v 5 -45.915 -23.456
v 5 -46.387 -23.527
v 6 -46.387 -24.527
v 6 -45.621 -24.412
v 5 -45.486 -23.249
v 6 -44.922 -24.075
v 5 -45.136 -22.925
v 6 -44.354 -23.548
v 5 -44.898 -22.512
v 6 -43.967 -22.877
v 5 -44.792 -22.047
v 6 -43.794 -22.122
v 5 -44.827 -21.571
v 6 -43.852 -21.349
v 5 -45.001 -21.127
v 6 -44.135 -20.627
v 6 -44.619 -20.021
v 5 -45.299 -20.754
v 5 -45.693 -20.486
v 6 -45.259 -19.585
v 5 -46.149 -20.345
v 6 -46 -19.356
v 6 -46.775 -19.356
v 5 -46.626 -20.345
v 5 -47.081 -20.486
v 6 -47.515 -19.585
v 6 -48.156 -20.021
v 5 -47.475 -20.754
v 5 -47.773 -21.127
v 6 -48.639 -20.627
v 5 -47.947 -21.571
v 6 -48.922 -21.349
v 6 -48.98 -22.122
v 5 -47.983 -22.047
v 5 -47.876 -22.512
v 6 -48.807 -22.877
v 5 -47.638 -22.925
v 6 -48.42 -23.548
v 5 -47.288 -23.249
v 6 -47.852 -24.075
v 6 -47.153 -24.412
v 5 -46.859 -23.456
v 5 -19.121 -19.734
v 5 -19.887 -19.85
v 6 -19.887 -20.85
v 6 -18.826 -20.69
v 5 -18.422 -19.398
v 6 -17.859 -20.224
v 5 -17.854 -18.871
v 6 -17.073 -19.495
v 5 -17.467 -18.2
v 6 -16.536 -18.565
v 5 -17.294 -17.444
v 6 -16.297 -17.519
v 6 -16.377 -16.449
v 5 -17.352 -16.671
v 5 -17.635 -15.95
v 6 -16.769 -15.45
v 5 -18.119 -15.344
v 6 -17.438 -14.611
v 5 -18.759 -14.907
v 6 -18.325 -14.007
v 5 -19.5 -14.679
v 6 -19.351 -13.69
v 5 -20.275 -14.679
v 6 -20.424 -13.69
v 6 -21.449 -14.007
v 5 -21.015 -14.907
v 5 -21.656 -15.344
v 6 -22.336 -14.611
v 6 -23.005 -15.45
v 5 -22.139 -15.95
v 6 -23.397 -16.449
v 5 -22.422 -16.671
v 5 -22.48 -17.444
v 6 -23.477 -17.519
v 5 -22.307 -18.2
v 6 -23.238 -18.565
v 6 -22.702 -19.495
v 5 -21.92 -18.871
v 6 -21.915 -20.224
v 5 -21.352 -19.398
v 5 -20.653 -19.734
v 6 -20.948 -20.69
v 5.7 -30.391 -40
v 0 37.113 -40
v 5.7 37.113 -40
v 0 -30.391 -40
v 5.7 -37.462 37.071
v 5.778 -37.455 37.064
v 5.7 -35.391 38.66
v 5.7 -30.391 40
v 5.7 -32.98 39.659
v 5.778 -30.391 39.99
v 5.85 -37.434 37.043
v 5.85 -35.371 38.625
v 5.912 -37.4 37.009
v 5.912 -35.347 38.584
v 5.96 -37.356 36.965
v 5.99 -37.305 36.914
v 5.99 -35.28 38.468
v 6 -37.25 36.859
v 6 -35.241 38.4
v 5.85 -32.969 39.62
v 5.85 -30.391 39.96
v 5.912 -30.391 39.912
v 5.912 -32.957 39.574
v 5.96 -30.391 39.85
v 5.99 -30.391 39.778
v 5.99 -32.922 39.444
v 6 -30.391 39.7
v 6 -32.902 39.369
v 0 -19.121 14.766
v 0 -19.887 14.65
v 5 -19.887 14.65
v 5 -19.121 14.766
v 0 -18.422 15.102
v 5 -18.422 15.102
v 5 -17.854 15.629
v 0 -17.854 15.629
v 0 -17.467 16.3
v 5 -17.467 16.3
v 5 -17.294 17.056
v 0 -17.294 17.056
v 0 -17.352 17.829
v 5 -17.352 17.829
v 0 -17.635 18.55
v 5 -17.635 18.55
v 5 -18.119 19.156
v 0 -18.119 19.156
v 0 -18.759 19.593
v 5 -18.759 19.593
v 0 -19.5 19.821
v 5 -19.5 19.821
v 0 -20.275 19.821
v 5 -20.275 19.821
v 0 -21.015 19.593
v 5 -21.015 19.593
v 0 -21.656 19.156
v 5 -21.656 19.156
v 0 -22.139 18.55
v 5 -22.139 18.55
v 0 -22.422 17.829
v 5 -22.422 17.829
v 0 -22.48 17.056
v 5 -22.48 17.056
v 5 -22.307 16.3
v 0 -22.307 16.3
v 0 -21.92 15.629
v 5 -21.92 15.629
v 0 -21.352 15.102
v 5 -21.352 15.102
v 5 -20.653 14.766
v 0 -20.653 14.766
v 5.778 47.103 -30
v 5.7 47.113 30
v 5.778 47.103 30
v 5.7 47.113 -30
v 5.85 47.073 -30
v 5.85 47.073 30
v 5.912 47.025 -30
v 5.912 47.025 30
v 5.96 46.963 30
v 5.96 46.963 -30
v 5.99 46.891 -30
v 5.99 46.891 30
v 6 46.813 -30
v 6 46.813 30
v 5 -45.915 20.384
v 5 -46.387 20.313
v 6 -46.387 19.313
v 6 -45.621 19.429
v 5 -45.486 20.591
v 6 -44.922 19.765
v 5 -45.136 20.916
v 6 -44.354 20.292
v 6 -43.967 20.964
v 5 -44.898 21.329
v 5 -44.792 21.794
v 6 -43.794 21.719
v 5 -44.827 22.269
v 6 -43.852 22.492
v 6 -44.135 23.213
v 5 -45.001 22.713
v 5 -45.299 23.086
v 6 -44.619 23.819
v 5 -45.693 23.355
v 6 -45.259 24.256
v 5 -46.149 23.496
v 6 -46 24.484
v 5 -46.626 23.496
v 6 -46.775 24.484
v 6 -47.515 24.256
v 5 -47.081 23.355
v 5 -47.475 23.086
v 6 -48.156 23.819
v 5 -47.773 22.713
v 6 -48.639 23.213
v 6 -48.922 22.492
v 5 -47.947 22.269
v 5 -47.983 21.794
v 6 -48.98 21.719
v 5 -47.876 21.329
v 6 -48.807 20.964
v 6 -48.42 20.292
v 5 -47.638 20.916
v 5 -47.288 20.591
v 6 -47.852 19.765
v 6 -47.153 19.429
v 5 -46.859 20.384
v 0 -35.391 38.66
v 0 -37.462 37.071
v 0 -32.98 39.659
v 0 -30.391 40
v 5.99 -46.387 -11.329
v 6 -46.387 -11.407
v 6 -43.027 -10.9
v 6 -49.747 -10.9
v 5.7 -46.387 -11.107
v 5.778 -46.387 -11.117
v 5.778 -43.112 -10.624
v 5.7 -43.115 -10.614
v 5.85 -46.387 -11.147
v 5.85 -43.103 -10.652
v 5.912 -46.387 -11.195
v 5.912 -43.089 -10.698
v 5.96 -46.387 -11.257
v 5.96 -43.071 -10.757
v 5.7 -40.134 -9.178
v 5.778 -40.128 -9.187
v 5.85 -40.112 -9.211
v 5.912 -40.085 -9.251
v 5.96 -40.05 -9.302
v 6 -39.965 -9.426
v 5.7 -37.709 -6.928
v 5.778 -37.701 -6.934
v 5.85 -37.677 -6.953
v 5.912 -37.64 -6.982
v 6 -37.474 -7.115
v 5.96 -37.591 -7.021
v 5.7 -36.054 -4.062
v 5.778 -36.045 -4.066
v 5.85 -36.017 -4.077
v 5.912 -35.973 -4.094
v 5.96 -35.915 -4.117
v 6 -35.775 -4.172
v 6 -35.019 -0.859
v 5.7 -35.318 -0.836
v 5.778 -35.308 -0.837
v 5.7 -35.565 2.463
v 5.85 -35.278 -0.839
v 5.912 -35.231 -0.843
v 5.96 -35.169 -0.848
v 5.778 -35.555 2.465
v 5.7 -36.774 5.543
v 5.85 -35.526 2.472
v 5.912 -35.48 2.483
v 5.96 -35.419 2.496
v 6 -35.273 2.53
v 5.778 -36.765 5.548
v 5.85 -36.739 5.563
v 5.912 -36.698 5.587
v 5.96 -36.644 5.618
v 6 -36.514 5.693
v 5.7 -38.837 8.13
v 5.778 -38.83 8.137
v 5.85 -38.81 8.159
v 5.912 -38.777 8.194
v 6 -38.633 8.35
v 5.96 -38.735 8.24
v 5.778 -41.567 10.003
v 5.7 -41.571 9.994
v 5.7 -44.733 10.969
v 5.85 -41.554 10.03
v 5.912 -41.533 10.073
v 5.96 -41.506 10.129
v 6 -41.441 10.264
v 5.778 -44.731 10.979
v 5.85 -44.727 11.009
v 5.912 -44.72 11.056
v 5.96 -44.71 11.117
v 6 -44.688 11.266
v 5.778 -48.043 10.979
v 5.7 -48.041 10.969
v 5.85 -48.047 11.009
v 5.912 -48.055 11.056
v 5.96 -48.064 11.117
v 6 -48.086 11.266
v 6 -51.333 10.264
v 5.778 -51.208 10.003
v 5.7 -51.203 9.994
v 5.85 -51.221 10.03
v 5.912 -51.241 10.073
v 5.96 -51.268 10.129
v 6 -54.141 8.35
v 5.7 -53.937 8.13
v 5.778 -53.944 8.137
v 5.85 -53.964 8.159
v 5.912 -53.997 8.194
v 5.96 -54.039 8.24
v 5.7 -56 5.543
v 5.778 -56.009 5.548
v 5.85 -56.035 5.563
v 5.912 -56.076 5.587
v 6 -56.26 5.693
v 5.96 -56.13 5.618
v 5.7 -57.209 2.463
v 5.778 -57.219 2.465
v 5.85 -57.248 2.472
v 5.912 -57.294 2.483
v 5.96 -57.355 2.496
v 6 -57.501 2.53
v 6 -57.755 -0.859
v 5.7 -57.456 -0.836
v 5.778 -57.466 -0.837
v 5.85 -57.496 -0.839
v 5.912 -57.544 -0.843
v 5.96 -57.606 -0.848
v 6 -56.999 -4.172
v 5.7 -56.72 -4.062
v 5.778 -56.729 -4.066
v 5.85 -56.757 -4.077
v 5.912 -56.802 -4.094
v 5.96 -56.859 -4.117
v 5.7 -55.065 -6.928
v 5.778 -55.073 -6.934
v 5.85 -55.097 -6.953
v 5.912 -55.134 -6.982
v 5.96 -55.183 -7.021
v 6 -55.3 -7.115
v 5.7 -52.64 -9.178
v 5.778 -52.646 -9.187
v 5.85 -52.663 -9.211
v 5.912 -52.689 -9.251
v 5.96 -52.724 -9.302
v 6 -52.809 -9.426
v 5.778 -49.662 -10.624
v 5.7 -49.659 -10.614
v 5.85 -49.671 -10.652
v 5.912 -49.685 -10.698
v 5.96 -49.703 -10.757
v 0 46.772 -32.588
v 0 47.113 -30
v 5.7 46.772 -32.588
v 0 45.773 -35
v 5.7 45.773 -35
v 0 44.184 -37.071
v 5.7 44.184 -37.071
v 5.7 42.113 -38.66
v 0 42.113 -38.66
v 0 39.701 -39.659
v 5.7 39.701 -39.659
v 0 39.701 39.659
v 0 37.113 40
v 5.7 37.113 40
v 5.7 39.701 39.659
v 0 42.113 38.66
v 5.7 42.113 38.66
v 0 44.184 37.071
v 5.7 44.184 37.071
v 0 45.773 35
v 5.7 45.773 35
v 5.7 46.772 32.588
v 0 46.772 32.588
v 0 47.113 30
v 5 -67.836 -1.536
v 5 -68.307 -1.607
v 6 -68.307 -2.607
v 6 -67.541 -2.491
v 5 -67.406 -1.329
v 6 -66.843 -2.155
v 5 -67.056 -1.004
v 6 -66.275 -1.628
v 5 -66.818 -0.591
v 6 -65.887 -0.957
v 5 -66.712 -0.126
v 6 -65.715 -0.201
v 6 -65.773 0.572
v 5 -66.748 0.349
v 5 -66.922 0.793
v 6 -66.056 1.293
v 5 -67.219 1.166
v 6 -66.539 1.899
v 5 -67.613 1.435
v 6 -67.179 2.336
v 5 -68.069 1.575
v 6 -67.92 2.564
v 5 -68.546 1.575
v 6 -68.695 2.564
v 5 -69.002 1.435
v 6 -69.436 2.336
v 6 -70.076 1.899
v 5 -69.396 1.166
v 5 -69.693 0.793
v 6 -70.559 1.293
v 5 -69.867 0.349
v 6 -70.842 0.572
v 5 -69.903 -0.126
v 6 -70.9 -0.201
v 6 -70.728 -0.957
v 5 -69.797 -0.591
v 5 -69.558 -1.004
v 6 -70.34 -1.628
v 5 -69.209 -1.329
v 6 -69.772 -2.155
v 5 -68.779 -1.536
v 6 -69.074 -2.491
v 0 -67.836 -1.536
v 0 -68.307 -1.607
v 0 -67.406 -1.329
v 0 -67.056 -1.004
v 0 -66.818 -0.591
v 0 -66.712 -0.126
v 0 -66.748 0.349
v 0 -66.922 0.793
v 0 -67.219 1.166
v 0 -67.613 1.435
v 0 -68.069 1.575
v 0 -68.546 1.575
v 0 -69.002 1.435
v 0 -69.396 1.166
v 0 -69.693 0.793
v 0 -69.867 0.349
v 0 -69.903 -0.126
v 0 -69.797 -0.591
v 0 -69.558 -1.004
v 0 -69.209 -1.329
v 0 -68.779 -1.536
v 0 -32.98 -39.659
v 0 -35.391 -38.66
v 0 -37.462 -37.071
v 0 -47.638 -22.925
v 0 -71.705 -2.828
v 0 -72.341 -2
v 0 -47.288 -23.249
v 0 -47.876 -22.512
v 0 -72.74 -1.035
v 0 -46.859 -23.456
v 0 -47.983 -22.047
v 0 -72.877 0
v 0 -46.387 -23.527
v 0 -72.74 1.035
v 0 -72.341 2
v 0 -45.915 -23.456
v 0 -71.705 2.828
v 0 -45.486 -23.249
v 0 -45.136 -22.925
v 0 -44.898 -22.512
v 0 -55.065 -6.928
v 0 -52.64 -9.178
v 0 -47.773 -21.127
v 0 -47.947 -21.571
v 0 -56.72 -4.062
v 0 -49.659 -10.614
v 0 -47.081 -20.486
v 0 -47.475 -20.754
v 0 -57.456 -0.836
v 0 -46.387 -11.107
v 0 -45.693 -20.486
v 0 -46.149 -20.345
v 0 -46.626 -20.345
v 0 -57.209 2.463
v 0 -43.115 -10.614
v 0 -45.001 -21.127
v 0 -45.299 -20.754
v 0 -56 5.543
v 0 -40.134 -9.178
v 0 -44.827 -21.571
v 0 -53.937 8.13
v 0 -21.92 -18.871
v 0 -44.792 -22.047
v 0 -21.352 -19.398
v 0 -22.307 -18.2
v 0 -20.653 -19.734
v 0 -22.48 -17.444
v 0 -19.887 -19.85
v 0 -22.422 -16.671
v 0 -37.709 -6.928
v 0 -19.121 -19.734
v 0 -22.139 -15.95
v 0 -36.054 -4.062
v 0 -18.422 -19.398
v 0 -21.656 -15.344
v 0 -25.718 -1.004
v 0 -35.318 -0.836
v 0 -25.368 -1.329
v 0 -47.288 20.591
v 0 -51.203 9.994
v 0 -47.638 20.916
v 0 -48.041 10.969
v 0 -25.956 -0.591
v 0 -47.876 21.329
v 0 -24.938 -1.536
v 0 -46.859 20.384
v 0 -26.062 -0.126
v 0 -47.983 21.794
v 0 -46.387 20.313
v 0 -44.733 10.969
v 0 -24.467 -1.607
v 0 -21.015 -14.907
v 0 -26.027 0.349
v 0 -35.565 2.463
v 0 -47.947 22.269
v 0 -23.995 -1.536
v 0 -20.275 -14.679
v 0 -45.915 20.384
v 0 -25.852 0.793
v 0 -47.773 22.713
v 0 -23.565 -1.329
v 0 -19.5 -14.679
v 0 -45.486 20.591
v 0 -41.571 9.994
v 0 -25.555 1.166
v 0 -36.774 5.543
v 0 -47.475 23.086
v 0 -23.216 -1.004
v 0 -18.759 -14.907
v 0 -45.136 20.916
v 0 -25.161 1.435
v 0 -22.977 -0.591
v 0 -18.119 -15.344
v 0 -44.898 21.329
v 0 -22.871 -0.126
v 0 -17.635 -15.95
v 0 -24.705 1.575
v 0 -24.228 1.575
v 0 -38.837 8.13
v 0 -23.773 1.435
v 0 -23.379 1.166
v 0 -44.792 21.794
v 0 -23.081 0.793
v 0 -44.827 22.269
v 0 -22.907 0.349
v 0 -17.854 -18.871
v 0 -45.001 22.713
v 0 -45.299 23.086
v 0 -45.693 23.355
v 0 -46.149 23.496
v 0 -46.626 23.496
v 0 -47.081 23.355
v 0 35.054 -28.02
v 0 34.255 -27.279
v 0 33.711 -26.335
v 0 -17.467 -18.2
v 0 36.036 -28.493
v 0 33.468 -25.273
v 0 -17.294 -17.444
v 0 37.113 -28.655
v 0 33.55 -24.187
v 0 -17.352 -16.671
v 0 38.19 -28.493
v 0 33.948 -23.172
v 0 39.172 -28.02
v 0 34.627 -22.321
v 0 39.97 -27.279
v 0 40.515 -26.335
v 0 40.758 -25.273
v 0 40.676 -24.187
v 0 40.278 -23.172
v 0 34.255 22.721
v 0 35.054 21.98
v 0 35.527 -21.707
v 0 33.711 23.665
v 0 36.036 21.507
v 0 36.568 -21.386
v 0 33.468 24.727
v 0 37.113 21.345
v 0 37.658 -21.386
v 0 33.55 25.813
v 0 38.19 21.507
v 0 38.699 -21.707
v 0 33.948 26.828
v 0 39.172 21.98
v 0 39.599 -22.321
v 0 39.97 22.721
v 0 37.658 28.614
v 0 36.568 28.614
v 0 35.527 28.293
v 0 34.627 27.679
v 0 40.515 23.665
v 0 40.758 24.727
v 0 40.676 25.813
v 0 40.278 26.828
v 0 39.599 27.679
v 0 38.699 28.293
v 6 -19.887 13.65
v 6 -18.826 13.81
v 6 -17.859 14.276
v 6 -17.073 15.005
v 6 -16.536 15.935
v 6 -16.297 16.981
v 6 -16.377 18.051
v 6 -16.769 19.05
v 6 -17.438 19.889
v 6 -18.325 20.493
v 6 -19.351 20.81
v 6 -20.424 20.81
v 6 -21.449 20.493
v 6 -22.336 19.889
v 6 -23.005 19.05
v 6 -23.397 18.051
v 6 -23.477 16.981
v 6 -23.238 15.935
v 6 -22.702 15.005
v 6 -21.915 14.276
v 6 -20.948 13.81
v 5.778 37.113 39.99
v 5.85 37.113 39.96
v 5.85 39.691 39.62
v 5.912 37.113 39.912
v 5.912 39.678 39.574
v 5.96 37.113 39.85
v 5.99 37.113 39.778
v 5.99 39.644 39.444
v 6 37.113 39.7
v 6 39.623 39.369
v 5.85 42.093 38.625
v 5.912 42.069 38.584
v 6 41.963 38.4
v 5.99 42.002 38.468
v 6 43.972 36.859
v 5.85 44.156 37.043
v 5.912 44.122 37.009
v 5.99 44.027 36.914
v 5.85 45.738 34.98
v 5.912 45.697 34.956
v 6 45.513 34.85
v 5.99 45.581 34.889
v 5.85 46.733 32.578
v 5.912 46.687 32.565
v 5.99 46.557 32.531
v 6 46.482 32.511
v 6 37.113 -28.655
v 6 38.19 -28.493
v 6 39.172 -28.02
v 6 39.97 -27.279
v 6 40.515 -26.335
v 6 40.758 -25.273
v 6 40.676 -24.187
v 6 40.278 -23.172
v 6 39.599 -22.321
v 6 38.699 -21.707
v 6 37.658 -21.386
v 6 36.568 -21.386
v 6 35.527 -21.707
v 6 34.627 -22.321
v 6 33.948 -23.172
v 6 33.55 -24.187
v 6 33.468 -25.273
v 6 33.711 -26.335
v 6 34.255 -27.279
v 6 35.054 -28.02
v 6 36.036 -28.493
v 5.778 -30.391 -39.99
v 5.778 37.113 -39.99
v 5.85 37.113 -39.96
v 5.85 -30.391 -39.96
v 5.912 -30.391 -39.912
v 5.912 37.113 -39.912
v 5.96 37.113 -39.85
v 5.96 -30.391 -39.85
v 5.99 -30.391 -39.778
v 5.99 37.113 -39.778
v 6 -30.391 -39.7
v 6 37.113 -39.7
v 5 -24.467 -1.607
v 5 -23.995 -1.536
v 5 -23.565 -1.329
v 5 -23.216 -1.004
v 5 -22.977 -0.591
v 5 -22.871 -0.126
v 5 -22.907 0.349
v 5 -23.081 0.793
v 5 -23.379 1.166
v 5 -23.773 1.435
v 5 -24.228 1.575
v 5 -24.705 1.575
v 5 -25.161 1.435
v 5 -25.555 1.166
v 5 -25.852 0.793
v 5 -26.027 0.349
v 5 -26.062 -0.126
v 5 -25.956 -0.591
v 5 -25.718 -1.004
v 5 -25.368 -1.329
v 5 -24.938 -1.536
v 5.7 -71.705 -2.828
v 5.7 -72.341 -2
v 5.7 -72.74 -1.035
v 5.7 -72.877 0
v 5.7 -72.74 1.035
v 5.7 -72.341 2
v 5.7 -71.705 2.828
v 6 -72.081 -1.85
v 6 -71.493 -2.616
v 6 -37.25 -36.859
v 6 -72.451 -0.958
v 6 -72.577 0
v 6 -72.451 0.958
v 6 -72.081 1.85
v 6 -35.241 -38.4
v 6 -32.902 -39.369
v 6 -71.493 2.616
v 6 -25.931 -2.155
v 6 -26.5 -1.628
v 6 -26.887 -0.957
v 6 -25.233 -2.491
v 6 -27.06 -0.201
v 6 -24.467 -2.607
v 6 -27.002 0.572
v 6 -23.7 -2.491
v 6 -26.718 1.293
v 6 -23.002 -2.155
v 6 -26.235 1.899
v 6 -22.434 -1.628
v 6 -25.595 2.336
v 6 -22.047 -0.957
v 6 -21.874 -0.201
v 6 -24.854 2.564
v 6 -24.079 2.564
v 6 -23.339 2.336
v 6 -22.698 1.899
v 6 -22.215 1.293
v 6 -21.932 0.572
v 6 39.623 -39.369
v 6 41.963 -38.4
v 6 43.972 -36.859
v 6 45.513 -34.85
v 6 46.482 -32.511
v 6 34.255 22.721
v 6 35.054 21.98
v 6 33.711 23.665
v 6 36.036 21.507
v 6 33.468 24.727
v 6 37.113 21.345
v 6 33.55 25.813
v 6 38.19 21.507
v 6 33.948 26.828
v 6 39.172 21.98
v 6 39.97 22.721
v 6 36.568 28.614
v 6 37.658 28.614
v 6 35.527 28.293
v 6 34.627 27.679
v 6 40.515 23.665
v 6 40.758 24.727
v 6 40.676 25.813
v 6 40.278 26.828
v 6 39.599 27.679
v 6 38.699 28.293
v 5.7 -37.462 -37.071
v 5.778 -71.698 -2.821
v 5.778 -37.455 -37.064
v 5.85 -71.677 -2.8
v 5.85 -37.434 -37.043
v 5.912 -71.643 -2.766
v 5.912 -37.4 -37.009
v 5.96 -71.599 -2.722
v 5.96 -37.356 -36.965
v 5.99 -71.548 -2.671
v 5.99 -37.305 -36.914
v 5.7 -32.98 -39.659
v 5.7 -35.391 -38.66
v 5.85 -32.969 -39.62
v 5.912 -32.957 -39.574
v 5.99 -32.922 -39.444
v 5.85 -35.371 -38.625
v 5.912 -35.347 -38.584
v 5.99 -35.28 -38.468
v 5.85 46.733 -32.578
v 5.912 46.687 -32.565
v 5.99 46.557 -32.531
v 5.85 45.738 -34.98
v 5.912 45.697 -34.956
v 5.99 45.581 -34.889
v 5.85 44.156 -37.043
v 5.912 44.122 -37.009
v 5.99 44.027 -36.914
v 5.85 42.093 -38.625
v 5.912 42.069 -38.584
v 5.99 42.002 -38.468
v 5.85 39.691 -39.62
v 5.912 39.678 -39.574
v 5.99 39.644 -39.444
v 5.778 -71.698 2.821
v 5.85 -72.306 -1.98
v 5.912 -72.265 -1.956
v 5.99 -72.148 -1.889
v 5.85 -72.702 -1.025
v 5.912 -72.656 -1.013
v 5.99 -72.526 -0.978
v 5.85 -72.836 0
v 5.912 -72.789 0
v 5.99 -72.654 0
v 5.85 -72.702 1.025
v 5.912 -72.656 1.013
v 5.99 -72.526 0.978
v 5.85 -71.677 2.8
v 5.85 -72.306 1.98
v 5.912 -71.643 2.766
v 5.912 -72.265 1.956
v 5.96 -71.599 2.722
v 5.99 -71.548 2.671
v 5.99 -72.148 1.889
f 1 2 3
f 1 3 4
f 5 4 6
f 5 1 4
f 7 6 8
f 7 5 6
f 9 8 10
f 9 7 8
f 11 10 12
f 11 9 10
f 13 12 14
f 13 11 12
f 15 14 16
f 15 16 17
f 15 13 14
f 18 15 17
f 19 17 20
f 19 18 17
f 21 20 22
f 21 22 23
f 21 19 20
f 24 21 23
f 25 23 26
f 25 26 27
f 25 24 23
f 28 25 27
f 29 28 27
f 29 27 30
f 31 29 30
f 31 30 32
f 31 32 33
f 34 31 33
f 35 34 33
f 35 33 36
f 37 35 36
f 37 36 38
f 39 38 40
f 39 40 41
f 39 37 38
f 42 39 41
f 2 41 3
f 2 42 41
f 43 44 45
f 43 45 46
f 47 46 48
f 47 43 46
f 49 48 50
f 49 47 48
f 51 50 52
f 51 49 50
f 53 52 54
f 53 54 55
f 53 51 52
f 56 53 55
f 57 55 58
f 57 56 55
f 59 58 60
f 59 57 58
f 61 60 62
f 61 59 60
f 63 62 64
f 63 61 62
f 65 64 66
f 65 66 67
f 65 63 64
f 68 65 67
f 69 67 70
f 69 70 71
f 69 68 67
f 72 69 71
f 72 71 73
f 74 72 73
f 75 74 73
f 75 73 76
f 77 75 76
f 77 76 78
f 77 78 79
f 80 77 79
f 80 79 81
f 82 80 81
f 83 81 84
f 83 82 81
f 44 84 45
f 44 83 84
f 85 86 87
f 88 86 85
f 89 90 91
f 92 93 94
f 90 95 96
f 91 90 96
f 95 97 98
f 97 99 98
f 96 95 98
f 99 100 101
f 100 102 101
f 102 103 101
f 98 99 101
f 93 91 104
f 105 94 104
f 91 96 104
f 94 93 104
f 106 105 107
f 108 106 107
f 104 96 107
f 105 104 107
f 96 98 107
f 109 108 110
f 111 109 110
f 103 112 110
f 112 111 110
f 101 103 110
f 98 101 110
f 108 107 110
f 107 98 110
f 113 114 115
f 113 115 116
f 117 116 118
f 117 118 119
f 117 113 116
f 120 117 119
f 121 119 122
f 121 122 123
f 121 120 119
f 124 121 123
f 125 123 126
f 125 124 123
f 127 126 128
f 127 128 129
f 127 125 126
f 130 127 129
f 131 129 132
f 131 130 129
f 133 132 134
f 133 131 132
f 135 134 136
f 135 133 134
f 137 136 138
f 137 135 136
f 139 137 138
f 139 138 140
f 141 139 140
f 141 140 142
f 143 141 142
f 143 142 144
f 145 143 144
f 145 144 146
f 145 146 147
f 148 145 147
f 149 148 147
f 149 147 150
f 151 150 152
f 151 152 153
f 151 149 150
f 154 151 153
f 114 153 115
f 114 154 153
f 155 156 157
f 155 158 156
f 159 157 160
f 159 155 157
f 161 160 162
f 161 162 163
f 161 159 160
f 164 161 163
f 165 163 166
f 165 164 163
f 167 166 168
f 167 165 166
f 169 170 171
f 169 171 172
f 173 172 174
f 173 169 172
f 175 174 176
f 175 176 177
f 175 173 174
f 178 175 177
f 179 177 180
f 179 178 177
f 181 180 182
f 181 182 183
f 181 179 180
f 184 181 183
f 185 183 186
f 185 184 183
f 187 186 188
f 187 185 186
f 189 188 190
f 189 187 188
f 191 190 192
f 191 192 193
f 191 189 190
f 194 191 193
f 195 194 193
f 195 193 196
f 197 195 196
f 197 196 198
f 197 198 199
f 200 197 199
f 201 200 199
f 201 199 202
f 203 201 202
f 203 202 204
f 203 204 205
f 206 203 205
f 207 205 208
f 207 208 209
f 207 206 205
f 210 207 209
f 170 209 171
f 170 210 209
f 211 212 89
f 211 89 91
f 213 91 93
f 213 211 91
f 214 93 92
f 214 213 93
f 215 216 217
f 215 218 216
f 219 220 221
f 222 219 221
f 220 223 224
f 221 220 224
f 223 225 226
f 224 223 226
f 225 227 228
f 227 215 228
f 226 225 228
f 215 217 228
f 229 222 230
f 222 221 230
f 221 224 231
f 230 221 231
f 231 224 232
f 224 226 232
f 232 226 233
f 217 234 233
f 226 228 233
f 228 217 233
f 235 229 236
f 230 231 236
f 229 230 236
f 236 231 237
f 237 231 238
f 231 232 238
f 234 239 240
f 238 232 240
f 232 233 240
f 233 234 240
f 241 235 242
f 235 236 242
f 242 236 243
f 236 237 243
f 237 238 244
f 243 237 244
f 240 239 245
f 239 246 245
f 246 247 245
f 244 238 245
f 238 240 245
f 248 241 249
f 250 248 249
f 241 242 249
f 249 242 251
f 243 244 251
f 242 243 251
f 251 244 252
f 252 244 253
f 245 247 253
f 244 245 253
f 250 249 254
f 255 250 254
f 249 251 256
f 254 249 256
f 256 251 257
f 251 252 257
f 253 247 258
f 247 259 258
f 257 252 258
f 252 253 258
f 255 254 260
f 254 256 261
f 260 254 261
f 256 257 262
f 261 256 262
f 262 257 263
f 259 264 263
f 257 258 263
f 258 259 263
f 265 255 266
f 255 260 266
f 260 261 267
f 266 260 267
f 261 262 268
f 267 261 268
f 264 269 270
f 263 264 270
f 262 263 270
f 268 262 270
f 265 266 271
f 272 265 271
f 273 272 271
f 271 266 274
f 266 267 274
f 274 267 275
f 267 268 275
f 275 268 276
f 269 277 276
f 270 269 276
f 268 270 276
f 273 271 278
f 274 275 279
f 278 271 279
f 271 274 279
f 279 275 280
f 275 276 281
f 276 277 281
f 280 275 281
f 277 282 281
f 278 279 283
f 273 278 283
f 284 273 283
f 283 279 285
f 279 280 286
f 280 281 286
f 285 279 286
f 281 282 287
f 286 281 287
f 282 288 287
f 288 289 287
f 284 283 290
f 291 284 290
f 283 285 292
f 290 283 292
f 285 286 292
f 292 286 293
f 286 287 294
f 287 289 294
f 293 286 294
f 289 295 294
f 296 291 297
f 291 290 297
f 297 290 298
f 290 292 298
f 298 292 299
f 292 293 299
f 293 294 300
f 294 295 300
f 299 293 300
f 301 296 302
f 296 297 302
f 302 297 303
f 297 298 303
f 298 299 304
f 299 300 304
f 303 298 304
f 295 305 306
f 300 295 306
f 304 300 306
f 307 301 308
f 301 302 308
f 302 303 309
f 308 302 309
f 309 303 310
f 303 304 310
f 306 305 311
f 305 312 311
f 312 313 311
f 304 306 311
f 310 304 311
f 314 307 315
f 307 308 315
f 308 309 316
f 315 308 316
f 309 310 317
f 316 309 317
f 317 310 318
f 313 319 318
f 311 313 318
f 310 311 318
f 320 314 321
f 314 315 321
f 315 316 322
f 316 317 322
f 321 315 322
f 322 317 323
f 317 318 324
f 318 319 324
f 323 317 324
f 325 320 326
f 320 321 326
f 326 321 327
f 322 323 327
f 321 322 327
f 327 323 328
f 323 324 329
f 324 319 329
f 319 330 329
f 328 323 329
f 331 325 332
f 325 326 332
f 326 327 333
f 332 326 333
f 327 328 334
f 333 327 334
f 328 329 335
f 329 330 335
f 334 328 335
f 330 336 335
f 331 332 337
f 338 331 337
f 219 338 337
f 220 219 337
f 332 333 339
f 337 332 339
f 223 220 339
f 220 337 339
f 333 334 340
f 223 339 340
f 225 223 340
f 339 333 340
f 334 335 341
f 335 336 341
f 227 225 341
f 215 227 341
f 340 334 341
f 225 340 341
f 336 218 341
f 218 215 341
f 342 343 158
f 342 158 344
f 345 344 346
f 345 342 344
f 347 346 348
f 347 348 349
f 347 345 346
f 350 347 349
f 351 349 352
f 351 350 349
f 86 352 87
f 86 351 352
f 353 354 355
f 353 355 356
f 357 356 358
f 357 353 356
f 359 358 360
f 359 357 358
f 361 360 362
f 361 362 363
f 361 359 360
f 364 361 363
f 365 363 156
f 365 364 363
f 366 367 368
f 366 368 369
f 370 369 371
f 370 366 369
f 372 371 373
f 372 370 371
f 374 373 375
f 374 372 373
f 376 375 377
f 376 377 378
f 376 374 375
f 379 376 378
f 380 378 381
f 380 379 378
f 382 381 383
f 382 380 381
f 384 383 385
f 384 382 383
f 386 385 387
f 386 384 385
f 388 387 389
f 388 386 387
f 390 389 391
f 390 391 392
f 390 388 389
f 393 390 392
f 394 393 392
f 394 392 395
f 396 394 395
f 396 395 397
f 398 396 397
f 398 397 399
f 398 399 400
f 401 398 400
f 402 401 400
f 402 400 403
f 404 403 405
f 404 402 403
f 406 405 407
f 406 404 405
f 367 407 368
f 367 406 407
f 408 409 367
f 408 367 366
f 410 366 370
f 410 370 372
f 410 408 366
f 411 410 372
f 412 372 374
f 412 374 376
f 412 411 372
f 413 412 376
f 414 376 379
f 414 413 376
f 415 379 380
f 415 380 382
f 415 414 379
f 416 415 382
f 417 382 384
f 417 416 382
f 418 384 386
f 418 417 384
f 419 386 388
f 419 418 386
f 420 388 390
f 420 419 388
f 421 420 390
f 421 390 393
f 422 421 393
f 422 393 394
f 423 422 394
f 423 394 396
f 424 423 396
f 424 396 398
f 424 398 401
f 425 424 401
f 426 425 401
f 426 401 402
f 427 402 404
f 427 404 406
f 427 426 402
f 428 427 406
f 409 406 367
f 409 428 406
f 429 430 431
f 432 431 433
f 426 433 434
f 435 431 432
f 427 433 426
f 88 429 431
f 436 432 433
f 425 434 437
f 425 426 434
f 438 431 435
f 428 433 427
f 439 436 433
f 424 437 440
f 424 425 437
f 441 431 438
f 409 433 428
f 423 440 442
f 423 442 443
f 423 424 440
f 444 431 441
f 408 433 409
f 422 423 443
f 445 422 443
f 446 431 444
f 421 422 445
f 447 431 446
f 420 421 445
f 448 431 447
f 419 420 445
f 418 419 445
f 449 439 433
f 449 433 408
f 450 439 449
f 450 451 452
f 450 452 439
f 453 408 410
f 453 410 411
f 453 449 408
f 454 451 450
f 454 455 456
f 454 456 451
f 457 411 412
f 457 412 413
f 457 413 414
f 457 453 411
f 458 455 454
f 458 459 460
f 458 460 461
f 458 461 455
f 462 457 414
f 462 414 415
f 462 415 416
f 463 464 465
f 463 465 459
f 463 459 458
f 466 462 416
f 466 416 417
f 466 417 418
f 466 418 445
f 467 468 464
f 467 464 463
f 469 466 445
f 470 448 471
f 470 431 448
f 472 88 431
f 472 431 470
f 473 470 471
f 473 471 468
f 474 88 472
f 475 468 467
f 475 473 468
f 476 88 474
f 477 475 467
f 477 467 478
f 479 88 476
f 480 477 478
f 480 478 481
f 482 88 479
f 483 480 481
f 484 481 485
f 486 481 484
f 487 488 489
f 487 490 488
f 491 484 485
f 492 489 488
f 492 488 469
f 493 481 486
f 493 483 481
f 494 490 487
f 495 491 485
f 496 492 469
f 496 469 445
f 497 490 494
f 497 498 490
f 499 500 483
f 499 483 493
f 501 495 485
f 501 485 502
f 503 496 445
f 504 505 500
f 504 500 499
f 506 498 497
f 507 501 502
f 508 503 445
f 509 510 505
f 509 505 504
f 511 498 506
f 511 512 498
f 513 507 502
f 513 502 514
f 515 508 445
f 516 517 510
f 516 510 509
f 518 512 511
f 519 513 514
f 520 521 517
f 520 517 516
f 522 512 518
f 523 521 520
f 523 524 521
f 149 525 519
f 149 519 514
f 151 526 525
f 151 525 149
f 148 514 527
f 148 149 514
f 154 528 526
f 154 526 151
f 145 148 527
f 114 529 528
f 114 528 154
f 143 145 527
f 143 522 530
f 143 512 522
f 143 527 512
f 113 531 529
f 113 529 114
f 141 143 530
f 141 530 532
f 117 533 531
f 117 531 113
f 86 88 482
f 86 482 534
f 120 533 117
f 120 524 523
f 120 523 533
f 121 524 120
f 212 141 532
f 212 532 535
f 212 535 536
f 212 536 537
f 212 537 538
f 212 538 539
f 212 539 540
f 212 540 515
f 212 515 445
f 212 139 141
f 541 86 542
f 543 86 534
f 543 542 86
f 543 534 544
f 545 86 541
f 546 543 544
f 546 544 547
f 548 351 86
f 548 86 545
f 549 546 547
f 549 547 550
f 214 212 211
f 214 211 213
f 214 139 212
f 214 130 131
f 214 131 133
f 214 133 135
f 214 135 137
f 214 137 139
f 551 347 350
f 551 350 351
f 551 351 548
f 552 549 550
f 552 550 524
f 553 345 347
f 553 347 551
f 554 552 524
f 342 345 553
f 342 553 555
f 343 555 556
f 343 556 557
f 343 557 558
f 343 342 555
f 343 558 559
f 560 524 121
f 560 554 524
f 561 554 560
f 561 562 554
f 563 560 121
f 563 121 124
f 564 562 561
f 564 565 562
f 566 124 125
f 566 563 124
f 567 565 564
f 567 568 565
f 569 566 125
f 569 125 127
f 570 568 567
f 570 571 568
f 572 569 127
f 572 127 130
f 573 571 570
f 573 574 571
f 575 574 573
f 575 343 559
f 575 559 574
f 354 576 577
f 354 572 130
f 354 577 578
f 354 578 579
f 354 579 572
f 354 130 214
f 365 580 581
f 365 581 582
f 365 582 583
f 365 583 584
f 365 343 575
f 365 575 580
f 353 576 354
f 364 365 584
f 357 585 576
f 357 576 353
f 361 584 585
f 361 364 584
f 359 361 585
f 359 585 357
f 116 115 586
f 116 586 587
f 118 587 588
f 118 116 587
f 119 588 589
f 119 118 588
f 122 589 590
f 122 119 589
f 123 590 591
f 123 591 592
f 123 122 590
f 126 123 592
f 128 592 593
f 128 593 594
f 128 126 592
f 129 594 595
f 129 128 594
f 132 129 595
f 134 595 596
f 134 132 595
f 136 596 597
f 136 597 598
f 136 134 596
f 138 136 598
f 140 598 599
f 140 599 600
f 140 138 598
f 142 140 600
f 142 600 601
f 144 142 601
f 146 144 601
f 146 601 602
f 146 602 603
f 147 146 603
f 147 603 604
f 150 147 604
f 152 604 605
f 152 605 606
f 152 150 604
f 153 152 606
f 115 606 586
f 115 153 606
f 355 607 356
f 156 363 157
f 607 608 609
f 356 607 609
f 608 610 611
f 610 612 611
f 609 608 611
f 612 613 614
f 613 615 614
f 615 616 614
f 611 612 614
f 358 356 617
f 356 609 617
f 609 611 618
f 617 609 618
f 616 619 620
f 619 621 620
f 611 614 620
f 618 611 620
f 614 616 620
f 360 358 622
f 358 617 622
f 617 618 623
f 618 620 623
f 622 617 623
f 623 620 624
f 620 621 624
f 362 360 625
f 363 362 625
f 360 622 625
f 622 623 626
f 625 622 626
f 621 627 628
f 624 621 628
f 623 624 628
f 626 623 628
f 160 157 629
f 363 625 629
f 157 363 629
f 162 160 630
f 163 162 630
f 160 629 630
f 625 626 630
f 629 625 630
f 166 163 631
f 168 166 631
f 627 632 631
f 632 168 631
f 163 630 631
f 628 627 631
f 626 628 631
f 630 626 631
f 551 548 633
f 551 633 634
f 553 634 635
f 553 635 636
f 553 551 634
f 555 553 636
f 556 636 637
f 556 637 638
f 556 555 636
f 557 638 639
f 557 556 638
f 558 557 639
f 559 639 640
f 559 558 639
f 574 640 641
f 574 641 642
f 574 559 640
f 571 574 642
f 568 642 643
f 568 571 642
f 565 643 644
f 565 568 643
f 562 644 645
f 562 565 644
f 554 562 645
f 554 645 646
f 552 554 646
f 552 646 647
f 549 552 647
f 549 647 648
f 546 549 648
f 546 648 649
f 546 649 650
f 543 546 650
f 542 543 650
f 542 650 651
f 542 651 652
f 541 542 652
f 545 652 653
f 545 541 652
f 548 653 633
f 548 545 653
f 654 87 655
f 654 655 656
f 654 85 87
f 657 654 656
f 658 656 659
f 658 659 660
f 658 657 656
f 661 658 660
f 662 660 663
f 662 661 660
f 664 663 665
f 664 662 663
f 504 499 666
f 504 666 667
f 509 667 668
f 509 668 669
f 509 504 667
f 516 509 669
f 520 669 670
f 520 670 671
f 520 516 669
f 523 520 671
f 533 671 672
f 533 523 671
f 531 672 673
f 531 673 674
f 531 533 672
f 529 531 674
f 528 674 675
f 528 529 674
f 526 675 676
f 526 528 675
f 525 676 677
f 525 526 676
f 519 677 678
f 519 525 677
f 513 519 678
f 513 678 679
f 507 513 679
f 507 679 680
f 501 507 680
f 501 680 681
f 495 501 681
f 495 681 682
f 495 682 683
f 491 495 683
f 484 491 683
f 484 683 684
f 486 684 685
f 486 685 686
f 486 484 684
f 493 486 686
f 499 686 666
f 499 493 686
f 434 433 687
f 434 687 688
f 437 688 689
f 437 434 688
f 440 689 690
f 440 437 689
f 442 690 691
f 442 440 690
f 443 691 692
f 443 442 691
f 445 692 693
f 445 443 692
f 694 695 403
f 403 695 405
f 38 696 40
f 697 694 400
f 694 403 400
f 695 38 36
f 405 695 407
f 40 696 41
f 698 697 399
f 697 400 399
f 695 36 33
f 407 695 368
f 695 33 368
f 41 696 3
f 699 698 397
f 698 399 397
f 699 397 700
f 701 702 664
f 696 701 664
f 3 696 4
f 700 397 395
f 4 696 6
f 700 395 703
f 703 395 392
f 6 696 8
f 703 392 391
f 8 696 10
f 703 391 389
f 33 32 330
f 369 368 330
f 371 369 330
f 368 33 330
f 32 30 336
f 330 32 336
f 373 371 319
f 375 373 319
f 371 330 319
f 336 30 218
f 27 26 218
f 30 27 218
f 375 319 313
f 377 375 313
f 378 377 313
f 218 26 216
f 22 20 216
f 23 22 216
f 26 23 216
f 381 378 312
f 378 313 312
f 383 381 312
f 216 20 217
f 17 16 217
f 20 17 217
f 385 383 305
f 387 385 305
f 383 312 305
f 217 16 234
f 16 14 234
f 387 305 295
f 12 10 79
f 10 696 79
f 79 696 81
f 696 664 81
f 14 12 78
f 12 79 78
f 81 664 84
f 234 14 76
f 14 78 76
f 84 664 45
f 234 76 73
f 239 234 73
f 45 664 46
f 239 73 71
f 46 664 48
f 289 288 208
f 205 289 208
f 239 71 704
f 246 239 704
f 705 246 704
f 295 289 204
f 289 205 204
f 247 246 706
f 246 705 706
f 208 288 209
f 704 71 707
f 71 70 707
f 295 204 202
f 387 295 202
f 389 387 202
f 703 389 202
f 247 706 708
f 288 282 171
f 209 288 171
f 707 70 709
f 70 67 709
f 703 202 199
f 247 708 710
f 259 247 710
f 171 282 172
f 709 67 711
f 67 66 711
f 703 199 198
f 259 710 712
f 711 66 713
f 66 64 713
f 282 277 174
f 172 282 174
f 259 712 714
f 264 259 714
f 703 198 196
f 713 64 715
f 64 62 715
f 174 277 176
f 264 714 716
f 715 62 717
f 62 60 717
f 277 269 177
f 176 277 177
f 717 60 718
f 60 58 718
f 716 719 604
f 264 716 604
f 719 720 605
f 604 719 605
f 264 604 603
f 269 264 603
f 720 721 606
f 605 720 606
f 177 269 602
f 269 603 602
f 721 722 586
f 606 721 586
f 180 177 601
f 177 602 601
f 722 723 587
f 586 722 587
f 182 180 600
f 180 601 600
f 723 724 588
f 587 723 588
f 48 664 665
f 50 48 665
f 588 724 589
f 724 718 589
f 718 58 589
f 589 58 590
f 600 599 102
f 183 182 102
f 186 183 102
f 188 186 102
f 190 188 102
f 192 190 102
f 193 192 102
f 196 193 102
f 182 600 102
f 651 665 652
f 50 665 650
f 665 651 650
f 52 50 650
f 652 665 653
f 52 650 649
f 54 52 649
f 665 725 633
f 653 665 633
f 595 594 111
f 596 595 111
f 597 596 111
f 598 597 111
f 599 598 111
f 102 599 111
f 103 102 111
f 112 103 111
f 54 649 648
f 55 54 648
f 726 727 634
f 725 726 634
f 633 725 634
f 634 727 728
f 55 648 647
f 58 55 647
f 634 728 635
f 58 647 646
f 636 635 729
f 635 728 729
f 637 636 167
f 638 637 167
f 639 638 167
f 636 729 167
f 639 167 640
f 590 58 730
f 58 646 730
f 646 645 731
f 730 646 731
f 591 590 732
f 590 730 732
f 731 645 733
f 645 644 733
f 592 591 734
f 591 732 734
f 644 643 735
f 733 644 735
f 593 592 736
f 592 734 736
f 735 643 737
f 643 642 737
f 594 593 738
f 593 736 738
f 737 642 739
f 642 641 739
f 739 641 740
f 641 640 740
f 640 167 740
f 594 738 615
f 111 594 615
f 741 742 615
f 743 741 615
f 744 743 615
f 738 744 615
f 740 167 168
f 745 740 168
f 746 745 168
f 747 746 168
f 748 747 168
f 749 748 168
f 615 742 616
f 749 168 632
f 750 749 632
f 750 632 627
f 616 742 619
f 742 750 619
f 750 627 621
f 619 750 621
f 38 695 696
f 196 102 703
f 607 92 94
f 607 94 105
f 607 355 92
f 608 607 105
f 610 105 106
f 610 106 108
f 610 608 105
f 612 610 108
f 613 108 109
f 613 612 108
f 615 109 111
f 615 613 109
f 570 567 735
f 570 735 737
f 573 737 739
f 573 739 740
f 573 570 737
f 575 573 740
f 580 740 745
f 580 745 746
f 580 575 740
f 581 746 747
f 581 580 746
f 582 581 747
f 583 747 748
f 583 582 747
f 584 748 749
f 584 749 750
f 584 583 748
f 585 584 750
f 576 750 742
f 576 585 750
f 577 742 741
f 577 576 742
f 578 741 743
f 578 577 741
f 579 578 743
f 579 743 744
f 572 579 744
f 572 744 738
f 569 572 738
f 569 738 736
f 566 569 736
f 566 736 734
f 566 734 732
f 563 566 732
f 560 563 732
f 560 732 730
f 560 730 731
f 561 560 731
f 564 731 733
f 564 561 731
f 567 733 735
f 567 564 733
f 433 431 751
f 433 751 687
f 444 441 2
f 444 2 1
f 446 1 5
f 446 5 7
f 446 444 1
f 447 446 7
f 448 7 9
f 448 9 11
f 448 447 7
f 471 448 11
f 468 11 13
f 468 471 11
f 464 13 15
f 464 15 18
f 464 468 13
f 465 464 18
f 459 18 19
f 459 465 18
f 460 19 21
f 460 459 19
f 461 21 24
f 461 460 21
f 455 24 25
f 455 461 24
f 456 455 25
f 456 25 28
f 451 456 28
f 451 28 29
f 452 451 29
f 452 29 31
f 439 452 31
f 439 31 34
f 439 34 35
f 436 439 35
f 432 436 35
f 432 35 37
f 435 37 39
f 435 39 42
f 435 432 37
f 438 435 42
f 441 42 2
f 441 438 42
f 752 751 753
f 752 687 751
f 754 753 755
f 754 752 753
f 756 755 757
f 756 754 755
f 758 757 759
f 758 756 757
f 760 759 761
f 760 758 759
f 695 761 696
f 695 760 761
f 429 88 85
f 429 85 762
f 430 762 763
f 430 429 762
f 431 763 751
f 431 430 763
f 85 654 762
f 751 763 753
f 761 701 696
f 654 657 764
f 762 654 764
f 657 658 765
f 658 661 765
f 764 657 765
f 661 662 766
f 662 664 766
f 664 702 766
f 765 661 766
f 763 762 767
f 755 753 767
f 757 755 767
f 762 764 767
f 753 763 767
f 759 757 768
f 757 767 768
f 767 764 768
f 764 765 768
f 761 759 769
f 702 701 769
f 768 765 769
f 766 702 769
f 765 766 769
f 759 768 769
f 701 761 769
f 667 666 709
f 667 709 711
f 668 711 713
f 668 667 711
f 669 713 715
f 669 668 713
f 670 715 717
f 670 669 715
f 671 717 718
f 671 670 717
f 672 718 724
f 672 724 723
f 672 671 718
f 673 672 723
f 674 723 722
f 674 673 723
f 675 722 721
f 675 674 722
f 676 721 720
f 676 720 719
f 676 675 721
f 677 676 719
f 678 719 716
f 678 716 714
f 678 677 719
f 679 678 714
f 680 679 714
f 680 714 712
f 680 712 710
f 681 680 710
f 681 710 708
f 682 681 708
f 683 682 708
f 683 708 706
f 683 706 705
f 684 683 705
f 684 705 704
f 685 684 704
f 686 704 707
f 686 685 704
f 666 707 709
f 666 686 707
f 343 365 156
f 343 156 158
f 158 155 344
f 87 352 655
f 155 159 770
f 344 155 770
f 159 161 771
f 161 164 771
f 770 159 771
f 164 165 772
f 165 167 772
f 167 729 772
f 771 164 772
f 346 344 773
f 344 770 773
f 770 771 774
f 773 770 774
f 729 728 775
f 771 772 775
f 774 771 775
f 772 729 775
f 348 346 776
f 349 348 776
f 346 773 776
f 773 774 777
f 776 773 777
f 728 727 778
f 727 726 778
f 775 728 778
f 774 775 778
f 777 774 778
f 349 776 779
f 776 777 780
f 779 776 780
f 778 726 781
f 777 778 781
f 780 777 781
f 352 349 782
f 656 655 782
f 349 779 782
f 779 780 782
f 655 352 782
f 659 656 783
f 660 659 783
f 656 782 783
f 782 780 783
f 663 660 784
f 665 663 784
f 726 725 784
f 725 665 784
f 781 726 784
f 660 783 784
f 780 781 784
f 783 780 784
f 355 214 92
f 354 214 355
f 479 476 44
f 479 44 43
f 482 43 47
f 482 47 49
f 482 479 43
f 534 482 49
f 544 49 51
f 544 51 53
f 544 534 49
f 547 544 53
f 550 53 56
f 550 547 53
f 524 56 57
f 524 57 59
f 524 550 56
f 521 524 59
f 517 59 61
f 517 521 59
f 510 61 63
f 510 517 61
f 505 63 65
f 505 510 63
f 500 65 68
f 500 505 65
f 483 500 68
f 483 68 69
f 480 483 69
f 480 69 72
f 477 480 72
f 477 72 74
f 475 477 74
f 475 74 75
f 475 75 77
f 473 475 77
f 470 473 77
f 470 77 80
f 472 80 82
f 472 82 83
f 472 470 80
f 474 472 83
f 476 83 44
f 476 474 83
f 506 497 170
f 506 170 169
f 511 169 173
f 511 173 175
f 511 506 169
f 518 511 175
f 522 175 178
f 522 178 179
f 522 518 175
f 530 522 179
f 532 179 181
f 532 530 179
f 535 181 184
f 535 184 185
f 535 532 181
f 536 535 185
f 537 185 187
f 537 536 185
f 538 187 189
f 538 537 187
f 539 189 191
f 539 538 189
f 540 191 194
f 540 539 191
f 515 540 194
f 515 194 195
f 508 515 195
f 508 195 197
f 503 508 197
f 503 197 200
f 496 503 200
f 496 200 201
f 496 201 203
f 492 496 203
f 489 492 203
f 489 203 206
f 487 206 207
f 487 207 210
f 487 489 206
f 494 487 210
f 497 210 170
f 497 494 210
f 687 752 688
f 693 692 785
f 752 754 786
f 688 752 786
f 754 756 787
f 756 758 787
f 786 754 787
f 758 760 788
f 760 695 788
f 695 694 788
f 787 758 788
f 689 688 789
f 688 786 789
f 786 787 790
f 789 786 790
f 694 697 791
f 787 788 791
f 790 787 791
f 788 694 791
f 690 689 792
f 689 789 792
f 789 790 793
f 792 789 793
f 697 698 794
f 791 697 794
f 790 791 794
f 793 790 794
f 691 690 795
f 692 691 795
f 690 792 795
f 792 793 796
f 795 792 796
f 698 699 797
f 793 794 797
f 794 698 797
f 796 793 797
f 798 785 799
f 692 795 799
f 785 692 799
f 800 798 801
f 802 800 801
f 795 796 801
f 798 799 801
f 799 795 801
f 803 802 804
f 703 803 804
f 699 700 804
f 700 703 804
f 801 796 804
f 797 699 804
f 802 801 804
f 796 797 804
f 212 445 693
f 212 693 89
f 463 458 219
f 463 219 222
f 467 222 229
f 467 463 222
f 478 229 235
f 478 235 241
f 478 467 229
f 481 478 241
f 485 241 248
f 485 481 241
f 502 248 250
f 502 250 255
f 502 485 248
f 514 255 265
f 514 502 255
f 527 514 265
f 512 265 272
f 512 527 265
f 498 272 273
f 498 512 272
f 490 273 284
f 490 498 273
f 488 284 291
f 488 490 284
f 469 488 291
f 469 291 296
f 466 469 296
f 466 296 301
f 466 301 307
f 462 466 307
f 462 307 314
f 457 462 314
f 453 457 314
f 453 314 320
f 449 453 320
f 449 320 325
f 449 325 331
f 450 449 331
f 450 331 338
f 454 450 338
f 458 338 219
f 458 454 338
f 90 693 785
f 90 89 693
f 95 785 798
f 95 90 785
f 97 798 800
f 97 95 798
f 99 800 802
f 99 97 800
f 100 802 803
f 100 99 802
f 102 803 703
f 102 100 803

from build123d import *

# Parameters (mm, degrees)
SKETCH_2_R      = 1.6
SKETCH_2_R_2    = 2.6
SKETCH_2_R_3    = 11.1
SKETCH_2_R_4    = 3.655
EXTRUDE_1_DEPTH = 6
FILLET_1_R      = 0.3
CHAMFER_1_SIZE  = 1


with BuildPart() as part:
    # Эскиз2 → Бобышка-Вытянуть1 (new body)
    with BuildSketch(Plane(origin=(0, 0, 0), x_dir=(0, 0, -1), z_dir=(1, 0, 0))):
        with BuildLine():
            Line((-30, 47.1129), (30, 47.1129))
            ThreePointArc((30, 47.1129), (37.071067812, 44.183967812), (40, 37.1129))
            Line((40, 37.1129), (40, -30.391408151))
            ThreePointArc((40, -30.391408151), (39.238795325, -34.218242474), (37.071067812, -37.462475962))
            Line((37.071067812, -37.462475962), (2.828427125, -71.70511665))
            ThreePointArc((2.828427125, -71.70511665), (0, -72.876689525), (-2.828427125, -71.70511665))
            Line((-2.828427125, -71.70511665), (-37.071067812, -37.462475962))
            ThreePointArc((-37.071067812, -37.462475962), (-39.238795325, -34.218242474), (-40, -30.391408151))
            Line((-40, -30.391408151), (-40, 37.1129))
            ThreePointArc((-40, 37.1129), (-37.071067812, 44.183967812), (-30, 47.1129))
        make_face()
        with Locations((-21.913410217, -46.3871)):
            Circle(SKETCH_2_R, mode=Mode.SUBTRACT)
        with Locations((17.25, -19.8871)):
            Circle(SKETCH_2_R_2, mode=Mode.SUBTRACT)
        with Locations((-17.25, -19.8871)):
            Circle(SKETCH_2_R_2, mode=Mode.SUBTRACT)
        with Locations((0.0069, -46.3871)):
            Circle(SKETCH_2_R_3, mode=Mode.SUBTRACT)
        with Locations((-25, 37.1129)):
            Circle(SKETCH_2_R_4, mode=Mode.SUBTRACT)
        with Locations((25, 37.1129)):
            Circle(SKETCH_2_R_4, mode=Mode.SUBTRACT)
        with Locations((0.0069, -24.466789783)):
            Circle(SKETCH_2_R, mode=Mode.SUBTRACT)
        with Locations((21.927210217, -46.3871)):
            Circle(SKETCH_2_R, mode=Mode.SUBTRACT)
        with Locations((0.0069, -68.307410217)):
            Circle(SKETCH_2_R, mode=Mode.SUBTRACT)
    extrude(amount=EXTRUDE_1_DEPTH)

    # Скругление1
    fillet_1_edges = [part.edges().sort_by_distance(p)[0] for p in [
        (6, 44.183967812, 37.071067812),
        (6, 3.360745925, 40),
        (6, -34.218242474, 39.238795325),
        (6, -54.583796306, 19.949747468),
        (6, -72.876689525, 0),
        (6, -54.583796306, -19.949747468),
        (6, -34.218242474, -39.238795325),
        (6, 3.360745925, -40),
        (6, 44.183967812, -37.071067812),
        (6, -46.3871, 11.0931),
        (6, 47.1129, 0),
    ]]
    fillet(fillet_1_edges, radius=FILLET_1_R)

    # Фаска1
    chamfer_1_edges = [part.edges().sort_by_distance(p)[0] for p in [
        (6, -24.466789783, 1.5931),
        (6, -46.3871, 23.513410217),
        (6, -46.3871, -20.327210217),
        (6, -68.307410217, 1.5931),
        (6, -19.8871, -14.65),
        (6, -19.8871, 19.85),
    ]]
    chamfer(chamfer_1_edges, length=CHAMFER_1_SIZE)


solid = part.part
